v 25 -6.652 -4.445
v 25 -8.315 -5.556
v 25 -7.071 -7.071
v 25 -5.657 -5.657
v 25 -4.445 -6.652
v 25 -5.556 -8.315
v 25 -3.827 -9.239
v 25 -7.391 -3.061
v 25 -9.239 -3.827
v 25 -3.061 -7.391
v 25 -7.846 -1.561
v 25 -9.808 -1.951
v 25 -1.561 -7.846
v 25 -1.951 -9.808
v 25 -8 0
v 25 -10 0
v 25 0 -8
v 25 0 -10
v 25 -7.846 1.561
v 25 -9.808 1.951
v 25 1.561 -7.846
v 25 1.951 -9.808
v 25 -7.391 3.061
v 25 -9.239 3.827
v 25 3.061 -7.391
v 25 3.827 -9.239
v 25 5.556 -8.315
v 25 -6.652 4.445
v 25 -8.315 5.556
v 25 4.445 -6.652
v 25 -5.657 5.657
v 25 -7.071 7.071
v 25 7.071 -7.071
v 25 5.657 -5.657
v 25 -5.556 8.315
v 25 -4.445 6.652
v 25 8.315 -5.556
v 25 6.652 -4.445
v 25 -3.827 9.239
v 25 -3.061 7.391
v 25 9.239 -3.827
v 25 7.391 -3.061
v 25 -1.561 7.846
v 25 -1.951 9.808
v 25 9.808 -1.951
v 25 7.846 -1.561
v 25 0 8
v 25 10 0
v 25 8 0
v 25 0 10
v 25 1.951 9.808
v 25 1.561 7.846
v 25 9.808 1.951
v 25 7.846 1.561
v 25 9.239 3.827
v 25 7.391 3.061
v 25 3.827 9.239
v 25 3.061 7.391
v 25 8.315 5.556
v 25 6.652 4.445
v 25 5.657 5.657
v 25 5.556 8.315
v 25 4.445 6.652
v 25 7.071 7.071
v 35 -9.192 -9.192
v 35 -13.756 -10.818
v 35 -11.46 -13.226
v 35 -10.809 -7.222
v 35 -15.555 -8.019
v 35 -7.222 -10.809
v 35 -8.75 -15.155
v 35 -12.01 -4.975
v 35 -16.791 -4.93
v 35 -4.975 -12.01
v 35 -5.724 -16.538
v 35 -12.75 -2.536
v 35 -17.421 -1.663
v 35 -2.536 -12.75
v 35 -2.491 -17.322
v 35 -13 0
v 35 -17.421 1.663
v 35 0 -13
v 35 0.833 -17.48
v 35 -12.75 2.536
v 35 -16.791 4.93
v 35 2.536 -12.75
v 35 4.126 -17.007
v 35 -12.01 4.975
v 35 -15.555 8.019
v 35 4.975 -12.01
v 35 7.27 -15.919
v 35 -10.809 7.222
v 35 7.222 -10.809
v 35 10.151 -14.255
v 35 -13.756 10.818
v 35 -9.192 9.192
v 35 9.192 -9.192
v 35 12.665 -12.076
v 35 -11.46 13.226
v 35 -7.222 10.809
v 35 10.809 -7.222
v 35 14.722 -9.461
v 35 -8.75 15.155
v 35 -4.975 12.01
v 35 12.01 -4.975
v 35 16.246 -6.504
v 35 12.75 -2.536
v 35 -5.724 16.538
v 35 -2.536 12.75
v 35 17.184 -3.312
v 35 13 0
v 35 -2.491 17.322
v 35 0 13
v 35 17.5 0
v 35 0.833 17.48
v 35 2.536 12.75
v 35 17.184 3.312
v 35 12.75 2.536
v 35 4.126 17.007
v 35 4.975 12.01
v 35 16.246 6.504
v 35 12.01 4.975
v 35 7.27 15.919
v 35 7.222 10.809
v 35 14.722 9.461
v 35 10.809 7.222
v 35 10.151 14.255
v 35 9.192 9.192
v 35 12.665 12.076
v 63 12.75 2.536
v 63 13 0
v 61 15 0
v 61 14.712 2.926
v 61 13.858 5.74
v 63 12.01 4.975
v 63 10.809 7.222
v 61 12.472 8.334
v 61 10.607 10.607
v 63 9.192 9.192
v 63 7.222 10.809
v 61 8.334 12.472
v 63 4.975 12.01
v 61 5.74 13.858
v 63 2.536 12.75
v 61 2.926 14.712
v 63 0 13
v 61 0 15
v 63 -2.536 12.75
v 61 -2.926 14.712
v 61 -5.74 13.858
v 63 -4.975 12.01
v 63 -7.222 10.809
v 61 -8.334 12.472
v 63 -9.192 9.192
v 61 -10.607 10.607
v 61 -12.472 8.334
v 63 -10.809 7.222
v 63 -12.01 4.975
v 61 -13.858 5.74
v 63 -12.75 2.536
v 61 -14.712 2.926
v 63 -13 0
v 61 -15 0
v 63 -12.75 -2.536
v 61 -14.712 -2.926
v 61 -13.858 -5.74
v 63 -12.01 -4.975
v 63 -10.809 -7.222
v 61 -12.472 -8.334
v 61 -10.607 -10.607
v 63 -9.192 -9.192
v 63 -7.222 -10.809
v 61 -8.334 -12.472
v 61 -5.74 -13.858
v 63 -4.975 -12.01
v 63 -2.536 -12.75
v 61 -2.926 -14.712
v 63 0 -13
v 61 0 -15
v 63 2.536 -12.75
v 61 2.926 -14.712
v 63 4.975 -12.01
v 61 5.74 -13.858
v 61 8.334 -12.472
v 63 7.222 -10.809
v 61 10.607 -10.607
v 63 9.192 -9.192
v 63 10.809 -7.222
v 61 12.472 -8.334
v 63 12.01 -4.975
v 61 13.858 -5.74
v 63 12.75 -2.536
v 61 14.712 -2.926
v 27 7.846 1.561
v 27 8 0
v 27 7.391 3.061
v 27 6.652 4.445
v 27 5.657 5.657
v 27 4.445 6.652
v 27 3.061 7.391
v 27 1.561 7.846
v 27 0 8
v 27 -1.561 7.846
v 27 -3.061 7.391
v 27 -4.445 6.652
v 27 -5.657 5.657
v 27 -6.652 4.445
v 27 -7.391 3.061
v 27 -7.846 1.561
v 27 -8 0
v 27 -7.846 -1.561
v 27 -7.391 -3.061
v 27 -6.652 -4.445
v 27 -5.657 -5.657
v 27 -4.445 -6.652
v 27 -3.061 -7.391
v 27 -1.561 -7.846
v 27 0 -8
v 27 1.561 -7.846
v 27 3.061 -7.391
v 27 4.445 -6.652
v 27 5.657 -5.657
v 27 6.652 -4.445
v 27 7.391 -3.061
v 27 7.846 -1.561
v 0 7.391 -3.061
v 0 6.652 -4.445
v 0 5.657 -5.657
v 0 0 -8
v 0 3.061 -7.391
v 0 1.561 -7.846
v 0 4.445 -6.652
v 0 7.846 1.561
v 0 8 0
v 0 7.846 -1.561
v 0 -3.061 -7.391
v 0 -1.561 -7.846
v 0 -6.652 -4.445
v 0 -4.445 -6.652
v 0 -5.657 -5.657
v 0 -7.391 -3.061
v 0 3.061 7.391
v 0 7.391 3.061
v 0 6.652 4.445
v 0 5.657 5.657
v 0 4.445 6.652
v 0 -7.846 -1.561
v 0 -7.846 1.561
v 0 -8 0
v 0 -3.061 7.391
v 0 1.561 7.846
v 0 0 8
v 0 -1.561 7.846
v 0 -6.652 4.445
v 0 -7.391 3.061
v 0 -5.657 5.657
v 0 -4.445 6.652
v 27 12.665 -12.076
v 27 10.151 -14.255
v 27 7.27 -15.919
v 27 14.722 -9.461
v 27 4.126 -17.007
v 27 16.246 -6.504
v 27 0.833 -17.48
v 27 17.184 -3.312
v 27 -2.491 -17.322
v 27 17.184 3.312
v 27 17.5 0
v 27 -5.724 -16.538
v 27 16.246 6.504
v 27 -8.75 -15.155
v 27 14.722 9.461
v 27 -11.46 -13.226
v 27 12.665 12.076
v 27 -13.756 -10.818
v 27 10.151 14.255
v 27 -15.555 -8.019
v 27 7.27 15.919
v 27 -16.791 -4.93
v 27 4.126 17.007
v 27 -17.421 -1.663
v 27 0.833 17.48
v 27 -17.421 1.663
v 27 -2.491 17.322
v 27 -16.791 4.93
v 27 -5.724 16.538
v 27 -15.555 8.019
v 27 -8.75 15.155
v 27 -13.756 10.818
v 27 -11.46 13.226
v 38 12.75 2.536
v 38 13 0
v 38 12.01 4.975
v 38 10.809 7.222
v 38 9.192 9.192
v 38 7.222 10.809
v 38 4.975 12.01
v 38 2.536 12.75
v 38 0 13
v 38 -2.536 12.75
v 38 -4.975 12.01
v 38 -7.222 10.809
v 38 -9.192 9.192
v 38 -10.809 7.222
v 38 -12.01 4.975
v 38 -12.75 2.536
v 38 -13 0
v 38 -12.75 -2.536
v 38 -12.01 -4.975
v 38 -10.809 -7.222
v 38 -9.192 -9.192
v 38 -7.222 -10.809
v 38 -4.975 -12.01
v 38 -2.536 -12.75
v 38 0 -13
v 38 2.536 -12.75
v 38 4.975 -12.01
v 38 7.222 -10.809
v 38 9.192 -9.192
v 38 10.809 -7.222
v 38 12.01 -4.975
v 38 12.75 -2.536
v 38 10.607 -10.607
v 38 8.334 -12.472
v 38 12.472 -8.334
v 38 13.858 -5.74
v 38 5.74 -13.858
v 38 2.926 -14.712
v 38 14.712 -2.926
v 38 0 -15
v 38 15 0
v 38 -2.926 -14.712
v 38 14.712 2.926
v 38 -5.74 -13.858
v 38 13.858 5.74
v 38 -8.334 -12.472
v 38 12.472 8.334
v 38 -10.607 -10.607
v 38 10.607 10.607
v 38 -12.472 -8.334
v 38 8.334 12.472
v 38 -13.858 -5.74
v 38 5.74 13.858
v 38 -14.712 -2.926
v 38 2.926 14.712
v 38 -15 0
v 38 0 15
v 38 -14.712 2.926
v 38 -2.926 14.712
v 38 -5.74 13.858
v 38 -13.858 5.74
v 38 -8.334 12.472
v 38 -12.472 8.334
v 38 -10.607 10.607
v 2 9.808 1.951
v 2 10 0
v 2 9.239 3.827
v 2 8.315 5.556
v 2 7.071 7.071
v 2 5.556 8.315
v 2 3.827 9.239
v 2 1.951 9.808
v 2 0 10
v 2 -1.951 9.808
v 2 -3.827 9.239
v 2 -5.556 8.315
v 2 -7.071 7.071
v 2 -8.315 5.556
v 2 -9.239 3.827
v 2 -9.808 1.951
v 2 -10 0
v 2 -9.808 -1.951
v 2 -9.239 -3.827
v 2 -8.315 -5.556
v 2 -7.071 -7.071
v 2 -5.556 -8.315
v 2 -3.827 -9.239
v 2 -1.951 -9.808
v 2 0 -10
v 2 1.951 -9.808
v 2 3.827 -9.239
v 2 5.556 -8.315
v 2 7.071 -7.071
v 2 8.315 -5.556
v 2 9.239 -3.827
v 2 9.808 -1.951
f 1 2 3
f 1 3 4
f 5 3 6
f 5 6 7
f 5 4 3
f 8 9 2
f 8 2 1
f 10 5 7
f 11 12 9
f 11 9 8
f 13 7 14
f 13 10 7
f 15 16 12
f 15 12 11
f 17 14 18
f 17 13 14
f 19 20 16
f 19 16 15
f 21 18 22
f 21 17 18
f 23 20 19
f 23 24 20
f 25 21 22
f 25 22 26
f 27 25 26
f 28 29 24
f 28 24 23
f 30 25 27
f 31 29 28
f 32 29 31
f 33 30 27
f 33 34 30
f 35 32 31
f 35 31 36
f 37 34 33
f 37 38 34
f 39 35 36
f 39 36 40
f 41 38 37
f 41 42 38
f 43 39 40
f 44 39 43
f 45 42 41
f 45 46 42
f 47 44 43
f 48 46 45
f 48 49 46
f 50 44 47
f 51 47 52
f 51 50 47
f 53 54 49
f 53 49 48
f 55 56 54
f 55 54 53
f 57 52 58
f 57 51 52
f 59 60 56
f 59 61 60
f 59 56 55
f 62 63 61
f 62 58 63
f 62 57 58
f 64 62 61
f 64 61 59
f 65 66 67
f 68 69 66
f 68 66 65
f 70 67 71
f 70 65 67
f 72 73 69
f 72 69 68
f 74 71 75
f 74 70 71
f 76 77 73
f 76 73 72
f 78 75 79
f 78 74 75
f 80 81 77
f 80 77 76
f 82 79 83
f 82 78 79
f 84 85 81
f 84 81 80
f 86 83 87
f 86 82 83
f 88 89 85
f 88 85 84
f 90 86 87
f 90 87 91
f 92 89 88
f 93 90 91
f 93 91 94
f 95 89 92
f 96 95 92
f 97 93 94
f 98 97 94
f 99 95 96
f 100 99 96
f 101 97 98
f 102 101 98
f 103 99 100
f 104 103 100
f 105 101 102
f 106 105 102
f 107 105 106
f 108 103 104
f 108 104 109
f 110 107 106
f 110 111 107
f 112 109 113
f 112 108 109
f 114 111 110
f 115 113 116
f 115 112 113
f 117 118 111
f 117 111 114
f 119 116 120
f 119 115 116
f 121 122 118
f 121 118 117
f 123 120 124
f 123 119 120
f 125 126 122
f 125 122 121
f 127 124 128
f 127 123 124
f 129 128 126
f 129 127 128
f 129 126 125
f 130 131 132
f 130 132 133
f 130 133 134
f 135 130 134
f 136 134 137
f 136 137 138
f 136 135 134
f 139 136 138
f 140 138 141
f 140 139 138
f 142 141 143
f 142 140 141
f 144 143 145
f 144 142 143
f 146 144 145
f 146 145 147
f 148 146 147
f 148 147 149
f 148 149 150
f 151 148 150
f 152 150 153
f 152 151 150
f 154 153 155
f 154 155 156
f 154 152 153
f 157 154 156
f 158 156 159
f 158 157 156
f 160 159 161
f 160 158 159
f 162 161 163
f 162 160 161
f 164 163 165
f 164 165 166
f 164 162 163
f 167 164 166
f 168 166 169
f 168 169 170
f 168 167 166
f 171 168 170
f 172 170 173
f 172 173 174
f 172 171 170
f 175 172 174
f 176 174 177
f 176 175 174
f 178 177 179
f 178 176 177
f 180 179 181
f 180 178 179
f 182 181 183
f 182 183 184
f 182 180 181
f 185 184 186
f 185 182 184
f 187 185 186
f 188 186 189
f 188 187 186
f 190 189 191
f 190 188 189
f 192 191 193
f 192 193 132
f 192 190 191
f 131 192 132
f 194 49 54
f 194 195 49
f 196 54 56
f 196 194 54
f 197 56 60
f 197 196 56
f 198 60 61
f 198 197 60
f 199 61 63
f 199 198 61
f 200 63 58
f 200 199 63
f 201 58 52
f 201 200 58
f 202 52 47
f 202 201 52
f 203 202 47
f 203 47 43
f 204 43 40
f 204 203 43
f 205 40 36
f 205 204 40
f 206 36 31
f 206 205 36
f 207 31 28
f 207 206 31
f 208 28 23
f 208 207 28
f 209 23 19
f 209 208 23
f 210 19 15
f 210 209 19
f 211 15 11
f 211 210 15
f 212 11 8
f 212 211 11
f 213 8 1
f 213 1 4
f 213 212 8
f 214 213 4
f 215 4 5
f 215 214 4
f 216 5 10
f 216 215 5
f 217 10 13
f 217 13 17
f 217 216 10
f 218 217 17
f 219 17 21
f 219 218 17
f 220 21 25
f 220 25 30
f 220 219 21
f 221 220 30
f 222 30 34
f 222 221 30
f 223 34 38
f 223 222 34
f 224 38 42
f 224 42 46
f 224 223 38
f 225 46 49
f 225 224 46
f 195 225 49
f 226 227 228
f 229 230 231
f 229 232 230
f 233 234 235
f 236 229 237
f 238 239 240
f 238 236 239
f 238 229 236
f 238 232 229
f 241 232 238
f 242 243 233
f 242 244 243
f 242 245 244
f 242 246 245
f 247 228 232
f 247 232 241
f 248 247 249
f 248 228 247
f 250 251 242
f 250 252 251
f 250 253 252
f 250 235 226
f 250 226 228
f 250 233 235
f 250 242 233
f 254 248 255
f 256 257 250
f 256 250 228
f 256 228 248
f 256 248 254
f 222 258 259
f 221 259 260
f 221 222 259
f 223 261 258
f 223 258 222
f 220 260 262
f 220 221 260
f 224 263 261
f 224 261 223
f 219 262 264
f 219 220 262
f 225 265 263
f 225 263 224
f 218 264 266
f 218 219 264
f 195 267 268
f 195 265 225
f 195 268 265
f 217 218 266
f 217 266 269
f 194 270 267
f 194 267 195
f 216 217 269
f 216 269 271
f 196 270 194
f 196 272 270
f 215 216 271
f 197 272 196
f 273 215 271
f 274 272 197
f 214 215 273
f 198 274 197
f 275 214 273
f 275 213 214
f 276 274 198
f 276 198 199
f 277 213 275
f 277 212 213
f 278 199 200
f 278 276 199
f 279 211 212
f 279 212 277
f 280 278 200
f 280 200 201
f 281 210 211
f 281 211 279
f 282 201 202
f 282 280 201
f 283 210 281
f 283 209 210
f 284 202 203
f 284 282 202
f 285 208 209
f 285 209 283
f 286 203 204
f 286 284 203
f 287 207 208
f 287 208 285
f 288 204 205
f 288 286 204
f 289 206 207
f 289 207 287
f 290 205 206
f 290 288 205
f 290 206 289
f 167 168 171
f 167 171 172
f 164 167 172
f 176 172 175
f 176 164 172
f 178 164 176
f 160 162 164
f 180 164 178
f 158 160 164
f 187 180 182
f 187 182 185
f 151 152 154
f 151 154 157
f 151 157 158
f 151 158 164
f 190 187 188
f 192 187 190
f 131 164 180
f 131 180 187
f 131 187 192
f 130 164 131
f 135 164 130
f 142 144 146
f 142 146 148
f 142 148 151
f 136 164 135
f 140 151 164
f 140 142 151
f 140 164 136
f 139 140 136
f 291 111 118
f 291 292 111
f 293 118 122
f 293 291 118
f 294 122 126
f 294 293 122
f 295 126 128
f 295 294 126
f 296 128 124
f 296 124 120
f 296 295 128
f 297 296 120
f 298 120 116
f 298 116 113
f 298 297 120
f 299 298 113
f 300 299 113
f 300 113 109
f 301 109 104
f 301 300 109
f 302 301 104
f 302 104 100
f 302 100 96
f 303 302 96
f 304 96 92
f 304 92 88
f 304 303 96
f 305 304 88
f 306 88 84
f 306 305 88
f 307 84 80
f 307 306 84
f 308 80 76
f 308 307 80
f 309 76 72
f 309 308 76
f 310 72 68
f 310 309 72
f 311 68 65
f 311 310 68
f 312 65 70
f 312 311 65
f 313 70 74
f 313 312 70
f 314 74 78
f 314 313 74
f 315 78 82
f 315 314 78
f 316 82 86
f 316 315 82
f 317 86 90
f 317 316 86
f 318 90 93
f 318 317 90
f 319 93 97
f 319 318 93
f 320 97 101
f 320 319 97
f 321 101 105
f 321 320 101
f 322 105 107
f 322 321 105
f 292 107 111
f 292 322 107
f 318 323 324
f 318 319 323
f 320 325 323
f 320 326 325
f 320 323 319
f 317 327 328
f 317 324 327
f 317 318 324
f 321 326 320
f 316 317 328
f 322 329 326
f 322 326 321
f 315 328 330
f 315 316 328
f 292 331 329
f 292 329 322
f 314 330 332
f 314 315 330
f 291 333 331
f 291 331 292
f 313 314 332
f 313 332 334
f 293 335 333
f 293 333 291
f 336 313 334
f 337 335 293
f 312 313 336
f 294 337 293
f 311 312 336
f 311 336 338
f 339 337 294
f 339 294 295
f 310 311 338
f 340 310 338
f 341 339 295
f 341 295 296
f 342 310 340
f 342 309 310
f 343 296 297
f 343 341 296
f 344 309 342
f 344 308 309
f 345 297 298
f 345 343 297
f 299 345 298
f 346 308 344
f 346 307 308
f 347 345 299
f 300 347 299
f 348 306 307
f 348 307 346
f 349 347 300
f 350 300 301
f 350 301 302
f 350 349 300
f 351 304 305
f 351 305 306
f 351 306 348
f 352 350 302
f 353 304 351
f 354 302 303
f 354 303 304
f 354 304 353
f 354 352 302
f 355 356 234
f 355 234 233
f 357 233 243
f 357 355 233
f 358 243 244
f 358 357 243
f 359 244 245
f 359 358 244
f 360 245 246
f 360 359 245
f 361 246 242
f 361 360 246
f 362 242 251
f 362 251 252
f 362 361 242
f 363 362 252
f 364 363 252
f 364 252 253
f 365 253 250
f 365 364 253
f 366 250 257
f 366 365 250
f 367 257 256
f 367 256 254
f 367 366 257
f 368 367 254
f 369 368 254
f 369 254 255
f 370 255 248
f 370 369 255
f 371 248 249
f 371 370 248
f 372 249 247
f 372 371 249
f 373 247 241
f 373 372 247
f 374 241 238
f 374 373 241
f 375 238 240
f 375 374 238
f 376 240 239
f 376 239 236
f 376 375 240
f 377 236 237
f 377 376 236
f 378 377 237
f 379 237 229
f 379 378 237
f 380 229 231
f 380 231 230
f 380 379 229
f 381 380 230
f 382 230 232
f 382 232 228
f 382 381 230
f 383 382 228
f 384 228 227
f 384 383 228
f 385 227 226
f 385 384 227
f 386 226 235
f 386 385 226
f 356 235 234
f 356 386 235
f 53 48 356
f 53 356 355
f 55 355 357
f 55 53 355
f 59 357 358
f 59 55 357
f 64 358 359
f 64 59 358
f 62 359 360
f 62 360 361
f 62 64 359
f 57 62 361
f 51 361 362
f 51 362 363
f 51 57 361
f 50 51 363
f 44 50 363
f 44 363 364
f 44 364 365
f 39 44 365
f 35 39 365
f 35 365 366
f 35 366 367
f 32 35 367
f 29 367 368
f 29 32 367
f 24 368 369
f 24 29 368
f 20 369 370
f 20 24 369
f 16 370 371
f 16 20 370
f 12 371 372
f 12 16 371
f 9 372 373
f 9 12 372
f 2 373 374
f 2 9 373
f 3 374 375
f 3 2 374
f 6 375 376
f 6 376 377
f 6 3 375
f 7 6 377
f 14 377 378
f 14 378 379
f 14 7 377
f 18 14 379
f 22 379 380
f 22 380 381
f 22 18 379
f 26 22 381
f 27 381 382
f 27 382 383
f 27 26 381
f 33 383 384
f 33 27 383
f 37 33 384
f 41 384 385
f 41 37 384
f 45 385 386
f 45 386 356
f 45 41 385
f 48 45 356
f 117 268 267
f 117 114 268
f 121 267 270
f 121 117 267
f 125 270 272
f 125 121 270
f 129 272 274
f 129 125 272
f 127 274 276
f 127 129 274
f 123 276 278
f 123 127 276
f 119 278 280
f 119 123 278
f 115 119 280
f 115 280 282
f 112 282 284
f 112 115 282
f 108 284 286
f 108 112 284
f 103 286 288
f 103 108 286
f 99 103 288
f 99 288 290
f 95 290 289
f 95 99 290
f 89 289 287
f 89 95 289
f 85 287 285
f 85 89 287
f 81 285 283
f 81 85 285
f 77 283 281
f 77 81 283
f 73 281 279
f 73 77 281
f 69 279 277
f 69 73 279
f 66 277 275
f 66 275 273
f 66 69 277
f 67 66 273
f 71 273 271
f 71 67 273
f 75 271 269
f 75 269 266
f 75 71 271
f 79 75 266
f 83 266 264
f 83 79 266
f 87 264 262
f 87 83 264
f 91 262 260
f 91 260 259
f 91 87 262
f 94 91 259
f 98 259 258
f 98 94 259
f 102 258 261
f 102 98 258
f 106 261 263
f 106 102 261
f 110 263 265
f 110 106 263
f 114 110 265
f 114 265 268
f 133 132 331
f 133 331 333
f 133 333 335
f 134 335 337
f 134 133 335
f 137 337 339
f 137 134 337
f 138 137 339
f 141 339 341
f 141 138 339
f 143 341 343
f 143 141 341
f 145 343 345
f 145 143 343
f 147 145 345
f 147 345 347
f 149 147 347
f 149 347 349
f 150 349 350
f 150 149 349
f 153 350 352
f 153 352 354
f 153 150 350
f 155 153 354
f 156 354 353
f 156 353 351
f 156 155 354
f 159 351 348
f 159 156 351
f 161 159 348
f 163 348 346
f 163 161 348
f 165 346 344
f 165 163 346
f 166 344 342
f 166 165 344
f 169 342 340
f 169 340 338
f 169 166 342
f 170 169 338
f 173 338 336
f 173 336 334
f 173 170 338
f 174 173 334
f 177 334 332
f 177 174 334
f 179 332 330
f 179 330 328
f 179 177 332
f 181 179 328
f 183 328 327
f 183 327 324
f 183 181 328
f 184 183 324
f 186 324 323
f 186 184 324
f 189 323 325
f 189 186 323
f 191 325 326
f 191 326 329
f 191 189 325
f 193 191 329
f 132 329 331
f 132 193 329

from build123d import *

# Parameters (mm, degrees)
CHAMFER_1_SIZE = 2


with BuildPart() as part:
    # 草图1 → 旋转1 (revolve)
    with BuildSketch(Plane.XY):
        Polygon((0, 0), (0, 10), (25, 10), (25, 8), (27, 8), (27, 17.5), (35, 17.5), (35, 13), (38, 13), (38, 15), (63, 15), (63, 0), align=None)
    revolve(axis=Axis((-82.844288888, 0, 0), (1, 0, 0)))

    # 倒角1
    chamfer_1_edges = [part.edges().sort_by_distance(p)[0] for p in [
        (0, -10, 0),
        (63, -15, 0),
    ]]
    chamfer(chamfer_1_edges, length=CHAMFER_1_SIZE)


solid = part.part
